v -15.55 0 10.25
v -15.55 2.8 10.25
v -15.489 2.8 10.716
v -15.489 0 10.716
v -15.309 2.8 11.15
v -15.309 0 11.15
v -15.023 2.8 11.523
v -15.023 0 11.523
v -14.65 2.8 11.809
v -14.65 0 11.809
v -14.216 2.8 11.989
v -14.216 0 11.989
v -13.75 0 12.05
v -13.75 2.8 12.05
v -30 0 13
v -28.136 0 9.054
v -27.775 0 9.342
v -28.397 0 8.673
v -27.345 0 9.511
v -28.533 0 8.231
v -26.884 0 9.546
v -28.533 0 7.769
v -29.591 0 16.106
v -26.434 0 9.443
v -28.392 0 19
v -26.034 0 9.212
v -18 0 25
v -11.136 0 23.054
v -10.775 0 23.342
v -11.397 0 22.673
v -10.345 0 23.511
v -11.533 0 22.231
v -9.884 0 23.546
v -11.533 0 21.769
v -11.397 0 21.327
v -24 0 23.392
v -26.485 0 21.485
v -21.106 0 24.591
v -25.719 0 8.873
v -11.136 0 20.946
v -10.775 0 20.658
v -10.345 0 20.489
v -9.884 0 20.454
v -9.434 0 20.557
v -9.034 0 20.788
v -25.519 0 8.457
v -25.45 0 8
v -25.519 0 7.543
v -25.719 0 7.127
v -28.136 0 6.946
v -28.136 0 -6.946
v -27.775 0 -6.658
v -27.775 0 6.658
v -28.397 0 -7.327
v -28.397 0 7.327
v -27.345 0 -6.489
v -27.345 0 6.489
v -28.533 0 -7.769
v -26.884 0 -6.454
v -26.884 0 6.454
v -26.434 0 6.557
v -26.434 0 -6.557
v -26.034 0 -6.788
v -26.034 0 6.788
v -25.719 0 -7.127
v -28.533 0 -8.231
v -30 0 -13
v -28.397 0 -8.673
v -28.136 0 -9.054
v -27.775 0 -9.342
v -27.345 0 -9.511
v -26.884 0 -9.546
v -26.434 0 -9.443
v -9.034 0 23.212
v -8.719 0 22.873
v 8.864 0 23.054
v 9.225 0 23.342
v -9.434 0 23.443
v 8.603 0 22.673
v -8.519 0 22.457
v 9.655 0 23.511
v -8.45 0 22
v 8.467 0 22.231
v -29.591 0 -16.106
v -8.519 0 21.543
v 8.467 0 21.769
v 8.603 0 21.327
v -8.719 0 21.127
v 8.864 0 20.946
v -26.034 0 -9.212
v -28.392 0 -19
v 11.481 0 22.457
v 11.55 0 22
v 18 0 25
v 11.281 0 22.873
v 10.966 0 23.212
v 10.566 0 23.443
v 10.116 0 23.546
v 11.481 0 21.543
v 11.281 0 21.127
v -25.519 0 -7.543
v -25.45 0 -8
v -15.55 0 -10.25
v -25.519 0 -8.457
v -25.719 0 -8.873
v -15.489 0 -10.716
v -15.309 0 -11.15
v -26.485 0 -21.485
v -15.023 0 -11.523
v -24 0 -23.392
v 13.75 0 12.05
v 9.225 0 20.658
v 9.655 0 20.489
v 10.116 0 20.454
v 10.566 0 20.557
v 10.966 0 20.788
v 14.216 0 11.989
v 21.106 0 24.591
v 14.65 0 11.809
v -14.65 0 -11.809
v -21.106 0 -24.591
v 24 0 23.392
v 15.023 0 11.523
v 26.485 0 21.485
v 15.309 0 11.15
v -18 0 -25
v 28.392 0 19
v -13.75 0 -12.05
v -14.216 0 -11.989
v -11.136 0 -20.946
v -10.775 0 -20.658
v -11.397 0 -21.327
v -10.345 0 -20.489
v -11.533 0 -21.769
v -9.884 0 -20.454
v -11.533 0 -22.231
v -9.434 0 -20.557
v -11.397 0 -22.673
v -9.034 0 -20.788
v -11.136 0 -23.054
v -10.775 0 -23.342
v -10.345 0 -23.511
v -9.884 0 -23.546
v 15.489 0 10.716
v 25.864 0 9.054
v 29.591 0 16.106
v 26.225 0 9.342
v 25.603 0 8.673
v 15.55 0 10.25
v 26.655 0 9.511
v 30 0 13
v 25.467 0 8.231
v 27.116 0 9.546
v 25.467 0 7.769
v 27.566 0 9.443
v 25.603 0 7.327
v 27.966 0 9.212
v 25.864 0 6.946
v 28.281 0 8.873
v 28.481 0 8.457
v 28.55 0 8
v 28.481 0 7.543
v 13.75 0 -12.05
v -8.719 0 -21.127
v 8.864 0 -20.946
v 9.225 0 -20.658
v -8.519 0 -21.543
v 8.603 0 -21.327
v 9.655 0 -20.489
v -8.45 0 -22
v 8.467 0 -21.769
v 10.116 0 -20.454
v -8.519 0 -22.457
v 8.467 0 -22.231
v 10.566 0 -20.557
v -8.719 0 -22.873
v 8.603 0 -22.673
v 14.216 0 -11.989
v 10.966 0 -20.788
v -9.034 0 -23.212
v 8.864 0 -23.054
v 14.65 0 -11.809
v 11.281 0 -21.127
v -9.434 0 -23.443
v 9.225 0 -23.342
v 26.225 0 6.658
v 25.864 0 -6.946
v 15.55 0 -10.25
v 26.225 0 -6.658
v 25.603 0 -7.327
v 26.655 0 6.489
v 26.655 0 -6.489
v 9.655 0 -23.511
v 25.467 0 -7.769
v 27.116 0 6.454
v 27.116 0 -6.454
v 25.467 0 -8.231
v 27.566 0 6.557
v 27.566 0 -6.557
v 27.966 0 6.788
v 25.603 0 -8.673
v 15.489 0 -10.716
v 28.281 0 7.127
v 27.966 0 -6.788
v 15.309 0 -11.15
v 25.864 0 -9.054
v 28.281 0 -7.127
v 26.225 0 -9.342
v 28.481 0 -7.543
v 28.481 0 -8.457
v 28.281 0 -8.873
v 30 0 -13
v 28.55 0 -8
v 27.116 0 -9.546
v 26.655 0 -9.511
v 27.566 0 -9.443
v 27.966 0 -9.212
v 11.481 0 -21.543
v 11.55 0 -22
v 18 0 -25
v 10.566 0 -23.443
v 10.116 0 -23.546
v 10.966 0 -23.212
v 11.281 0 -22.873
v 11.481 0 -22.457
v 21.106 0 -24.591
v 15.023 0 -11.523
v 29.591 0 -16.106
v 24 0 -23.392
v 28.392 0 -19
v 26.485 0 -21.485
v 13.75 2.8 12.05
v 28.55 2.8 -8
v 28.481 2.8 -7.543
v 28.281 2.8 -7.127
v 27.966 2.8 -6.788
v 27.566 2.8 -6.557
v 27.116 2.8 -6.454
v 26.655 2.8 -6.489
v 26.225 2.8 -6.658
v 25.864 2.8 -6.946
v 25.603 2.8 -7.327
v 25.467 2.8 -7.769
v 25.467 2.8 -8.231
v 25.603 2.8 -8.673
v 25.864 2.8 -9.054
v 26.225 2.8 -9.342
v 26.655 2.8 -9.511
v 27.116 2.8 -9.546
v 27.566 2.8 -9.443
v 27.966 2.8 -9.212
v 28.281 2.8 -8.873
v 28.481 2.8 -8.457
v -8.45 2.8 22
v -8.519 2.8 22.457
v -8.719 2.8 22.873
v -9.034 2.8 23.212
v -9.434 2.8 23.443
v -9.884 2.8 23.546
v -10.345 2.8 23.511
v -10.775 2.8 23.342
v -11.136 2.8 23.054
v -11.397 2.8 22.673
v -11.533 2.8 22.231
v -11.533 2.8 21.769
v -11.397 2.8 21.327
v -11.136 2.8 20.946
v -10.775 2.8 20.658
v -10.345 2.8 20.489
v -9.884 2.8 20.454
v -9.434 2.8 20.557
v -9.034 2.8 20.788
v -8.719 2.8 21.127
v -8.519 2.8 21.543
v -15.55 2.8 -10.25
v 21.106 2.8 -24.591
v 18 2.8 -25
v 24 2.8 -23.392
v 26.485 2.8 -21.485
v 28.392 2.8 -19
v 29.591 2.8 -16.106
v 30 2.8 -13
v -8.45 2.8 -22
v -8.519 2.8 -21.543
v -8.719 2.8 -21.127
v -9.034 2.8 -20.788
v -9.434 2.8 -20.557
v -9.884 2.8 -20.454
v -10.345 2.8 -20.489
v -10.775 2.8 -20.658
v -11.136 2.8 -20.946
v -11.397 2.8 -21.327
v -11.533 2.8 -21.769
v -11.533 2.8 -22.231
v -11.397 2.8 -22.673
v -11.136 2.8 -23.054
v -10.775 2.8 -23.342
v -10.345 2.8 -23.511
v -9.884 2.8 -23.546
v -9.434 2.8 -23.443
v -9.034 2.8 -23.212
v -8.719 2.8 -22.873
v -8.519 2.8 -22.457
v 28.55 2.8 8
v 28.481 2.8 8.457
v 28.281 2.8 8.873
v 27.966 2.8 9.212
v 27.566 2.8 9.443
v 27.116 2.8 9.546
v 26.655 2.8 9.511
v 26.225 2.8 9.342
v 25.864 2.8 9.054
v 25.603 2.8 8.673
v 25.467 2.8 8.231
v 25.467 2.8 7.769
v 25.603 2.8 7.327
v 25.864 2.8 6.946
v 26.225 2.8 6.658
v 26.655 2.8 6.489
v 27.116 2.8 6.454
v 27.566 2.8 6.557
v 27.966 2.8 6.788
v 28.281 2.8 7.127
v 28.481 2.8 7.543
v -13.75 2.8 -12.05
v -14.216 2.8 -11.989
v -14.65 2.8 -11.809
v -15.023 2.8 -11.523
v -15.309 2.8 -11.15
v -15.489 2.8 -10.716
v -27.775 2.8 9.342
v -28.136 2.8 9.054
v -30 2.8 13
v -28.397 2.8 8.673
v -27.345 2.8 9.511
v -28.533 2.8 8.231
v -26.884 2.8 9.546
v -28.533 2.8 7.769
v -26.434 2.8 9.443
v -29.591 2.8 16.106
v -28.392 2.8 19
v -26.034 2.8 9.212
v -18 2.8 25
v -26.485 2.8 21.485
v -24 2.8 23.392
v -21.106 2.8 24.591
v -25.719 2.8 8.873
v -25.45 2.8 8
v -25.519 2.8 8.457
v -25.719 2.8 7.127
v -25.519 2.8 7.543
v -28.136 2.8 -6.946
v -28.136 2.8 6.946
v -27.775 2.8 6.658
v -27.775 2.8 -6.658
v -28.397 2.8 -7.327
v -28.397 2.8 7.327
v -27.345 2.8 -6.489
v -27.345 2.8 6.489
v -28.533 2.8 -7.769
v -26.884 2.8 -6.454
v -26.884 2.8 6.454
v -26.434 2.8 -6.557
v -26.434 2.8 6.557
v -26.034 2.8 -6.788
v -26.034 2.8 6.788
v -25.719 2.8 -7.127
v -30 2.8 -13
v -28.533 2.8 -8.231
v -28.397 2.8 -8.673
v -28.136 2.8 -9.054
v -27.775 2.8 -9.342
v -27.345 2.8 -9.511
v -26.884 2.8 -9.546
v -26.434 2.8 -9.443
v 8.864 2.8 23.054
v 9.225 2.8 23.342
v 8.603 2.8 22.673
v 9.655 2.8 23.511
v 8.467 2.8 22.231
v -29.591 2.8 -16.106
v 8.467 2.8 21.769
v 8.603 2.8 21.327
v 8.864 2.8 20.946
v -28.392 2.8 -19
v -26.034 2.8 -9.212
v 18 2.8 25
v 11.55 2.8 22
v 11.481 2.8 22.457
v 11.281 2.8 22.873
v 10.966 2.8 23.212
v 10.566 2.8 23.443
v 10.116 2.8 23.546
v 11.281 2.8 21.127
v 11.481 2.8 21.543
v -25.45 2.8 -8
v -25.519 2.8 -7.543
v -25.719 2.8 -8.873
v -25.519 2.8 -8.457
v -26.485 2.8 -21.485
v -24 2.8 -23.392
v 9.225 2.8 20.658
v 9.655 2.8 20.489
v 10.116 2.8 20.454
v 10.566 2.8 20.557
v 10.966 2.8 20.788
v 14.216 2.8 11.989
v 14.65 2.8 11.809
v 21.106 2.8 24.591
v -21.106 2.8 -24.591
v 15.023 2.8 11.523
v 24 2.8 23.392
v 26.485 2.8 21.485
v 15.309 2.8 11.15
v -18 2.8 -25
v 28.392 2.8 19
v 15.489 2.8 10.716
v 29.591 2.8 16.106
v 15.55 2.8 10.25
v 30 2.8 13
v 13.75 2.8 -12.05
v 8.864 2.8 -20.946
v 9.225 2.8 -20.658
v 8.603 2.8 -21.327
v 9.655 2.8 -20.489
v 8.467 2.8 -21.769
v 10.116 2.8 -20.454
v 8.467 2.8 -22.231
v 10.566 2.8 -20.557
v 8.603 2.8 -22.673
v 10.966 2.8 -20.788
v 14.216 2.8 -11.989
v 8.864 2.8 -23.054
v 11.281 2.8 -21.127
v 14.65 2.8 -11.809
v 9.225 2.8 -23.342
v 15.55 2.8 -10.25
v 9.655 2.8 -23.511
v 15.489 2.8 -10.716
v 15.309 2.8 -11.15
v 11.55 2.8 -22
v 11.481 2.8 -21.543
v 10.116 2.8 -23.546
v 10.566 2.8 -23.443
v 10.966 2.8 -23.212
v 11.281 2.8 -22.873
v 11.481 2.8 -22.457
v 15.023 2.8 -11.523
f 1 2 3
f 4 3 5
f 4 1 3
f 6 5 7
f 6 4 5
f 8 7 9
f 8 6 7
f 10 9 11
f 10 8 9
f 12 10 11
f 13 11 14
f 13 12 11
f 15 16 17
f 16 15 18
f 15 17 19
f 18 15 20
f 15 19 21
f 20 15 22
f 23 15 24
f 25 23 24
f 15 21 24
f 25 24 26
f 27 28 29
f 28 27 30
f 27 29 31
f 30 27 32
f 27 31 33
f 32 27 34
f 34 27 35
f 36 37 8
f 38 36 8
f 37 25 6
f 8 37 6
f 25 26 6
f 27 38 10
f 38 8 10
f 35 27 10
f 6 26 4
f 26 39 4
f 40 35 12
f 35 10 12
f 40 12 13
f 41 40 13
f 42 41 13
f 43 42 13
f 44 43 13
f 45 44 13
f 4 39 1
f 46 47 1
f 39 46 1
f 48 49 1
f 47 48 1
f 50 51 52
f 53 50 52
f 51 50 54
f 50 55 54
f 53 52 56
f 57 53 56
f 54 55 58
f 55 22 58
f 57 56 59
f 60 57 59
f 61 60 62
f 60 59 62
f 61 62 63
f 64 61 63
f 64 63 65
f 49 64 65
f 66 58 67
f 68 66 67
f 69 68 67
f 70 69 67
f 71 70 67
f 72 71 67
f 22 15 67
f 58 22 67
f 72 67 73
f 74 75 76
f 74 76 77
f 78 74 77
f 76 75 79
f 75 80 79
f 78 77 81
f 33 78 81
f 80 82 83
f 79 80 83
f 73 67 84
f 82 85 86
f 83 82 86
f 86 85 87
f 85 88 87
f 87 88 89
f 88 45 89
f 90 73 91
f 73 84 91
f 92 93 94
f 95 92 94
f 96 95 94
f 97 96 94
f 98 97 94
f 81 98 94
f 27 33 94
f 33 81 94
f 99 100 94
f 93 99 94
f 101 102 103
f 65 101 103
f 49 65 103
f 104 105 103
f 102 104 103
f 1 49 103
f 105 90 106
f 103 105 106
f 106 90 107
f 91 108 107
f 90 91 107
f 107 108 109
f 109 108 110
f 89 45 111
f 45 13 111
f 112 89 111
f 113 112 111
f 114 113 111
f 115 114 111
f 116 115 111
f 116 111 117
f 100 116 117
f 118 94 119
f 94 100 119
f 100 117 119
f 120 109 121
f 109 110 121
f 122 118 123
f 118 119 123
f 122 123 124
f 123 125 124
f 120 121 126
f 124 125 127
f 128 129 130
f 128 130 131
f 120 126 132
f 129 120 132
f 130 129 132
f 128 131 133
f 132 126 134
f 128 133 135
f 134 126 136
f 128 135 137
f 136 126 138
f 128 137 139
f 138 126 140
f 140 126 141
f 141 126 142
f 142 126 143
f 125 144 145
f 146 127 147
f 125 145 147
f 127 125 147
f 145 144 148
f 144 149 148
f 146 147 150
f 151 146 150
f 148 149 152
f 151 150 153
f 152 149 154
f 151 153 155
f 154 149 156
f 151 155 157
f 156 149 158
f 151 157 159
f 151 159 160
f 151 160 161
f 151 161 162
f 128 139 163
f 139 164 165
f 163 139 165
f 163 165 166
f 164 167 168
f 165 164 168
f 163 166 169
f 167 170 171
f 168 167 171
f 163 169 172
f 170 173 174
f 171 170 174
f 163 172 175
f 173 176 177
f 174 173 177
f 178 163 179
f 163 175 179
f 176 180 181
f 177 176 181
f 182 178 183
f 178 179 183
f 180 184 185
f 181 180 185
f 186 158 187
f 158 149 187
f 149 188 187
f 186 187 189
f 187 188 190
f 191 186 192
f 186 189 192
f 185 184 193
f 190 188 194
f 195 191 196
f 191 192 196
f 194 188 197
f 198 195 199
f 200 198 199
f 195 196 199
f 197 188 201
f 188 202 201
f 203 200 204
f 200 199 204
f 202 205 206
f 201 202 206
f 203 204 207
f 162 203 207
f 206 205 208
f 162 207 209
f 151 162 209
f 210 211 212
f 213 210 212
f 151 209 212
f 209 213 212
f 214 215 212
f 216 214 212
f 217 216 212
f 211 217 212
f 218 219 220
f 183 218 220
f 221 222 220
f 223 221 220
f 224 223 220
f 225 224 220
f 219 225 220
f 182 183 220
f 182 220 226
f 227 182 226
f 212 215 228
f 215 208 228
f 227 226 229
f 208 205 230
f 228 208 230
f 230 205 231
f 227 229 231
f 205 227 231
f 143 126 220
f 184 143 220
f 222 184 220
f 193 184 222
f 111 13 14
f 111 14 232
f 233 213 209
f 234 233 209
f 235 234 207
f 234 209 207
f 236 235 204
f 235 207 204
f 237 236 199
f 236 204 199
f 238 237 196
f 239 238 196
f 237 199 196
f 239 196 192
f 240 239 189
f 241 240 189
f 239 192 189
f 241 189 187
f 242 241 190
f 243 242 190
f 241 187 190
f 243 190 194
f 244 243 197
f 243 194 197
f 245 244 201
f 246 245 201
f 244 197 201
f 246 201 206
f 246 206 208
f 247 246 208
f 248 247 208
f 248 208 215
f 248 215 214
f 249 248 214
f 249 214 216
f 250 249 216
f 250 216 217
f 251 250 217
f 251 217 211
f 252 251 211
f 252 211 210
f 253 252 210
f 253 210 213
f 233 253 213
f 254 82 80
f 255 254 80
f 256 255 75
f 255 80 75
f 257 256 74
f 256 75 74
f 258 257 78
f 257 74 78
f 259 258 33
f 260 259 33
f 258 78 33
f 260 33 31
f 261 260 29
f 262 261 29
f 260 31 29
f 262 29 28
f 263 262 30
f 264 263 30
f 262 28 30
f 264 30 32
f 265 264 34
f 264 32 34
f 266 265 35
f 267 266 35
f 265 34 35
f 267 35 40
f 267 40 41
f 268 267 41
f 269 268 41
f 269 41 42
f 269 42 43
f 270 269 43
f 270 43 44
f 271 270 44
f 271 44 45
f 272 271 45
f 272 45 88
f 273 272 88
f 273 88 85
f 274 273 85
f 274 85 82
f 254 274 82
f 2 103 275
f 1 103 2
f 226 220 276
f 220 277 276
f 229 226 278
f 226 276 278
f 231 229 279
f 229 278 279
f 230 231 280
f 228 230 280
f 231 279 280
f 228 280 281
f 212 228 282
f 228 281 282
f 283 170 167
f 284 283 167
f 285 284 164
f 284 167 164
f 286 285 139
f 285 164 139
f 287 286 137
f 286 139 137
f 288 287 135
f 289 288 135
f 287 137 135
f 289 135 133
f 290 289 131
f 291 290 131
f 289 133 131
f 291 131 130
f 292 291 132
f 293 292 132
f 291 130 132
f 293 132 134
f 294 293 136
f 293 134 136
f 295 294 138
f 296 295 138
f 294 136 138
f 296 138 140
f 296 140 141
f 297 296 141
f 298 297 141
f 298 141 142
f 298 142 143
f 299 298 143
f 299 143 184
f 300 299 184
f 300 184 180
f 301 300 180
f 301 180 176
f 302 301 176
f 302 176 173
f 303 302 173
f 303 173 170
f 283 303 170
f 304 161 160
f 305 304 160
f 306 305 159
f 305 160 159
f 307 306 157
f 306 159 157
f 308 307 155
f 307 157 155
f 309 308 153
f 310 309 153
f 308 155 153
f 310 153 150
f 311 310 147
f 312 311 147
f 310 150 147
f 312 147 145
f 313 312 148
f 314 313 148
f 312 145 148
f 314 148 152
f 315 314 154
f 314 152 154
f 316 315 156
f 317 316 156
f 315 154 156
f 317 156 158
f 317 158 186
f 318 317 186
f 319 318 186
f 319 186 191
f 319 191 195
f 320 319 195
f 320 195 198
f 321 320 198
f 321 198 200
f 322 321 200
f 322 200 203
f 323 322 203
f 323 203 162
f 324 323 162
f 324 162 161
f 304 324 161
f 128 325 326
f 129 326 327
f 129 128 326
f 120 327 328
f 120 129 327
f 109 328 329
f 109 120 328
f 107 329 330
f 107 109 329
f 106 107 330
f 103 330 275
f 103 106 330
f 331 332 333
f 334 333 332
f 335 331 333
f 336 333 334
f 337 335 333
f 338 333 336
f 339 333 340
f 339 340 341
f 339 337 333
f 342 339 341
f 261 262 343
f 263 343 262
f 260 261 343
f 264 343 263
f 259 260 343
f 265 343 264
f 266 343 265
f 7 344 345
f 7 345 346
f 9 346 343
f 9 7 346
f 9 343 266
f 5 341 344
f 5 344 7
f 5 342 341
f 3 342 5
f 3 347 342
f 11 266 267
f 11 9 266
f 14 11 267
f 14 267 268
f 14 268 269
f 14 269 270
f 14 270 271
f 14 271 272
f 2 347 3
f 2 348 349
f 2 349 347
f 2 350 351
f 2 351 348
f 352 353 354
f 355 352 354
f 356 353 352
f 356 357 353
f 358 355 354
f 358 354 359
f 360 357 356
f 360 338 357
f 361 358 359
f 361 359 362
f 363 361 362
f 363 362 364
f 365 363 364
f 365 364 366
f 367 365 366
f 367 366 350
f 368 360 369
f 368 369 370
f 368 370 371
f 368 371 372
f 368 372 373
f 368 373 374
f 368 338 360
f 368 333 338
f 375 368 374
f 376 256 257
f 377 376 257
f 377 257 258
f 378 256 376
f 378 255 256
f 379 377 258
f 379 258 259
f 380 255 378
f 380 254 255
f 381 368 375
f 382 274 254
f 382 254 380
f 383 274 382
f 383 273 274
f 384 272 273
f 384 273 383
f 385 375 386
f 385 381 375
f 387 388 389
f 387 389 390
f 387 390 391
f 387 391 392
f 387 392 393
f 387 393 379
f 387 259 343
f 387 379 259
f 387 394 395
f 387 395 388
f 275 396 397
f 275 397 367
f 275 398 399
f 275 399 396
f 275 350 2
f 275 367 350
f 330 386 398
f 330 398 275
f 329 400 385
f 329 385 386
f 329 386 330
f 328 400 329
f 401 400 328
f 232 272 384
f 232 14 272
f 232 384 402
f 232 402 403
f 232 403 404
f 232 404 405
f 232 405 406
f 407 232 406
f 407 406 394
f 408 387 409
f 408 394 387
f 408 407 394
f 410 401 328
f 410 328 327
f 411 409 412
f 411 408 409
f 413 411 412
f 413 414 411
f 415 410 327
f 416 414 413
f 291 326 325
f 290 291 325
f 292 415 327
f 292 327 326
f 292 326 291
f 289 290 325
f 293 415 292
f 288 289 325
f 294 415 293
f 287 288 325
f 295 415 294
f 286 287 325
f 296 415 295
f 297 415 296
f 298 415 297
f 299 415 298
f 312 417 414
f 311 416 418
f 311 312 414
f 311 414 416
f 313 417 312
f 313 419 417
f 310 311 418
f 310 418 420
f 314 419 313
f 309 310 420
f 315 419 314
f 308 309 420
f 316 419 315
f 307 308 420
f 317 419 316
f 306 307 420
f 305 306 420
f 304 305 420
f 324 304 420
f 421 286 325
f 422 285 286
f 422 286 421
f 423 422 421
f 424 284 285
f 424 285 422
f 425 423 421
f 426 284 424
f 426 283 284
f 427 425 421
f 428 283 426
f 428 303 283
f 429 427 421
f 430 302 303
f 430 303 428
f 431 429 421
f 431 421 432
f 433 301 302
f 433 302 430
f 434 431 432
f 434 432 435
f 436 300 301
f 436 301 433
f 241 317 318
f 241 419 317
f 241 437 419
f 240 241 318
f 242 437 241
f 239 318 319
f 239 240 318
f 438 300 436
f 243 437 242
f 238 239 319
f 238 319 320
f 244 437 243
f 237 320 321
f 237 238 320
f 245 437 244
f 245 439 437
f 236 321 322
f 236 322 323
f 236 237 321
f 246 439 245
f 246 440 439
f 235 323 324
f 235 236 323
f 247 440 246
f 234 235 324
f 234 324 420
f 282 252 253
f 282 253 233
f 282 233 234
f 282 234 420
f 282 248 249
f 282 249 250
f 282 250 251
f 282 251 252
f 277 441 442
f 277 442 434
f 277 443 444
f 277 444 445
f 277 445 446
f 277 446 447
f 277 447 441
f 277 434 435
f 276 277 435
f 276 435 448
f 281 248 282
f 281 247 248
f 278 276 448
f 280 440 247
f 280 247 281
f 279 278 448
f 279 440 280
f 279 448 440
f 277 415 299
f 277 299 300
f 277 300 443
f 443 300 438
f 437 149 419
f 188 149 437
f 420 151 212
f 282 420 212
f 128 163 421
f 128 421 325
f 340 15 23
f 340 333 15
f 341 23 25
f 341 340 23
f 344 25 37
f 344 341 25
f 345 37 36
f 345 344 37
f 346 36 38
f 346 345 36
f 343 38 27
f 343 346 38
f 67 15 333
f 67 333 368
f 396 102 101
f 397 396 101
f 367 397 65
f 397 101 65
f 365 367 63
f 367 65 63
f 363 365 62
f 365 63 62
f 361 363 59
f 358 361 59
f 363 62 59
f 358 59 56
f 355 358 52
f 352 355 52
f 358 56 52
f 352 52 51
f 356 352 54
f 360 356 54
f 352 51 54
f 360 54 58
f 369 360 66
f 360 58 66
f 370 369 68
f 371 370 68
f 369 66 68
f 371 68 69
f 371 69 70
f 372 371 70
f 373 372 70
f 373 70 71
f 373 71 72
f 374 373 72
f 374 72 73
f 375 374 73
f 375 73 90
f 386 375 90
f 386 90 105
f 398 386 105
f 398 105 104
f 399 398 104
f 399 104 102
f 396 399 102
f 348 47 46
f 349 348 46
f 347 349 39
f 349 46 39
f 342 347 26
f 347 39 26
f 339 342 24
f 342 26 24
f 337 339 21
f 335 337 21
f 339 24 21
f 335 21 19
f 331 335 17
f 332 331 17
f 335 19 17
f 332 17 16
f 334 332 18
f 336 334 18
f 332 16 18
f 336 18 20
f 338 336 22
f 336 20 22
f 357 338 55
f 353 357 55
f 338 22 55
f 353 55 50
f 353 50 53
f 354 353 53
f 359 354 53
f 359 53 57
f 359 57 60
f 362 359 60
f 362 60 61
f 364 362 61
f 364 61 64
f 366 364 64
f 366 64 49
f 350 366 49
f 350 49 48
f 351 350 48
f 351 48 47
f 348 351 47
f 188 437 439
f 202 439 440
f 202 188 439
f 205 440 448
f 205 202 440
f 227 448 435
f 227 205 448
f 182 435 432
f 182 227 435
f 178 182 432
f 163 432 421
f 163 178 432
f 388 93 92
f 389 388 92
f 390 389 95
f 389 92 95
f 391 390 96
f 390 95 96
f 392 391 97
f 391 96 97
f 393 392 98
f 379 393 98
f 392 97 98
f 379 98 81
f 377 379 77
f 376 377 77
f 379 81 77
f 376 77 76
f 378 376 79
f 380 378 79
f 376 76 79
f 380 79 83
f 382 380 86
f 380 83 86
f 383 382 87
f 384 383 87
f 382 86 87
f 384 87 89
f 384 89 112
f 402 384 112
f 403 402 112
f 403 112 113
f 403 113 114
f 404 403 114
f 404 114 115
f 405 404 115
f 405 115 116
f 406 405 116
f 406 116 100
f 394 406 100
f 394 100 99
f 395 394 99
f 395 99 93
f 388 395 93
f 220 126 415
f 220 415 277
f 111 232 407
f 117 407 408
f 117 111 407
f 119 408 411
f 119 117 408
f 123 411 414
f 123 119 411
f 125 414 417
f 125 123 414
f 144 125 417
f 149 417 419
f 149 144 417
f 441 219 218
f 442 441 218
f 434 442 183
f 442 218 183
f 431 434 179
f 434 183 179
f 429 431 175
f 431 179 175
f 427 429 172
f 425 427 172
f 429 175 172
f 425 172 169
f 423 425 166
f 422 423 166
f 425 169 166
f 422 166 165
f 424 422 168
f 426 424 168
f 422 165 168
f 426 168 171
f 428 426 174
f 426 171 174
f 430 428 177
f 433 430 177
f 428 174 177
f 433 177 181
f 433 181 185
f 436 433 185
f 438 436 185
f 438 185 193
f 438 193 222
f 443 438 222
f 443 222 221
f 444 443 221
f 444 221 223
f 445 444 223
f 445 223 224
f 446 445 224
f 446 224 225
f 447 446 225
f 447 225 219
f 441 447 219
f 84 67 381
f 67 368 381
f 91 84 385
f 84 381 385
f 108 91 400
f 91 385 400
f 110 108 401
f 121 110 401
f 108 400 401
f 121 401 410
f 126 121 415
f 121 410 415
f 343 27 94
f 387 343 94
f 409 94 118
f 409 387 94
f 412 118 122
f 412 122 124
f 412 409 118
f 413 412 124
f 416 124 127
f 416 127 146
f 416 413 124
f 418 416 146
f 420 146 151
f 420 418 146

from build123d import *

# Parameters (mm, degrees)
SKETCH_1_W          = 60
SKETCH_1_H          = 50
SKETCH_1_W_2        = 29.5
SKETCH_1_H_2        = 22.5
EXTRUDE_1_DEPTH     = 2.8
SKETCH_8_R          = 1.55
CUT_EXTRUDE_2_DEPTH = 10
FILLET_1_R          = 1
FILLET_2_R          = 12
CUT_EXTRUDE_3_DEPTH = 10


with BuildPart() as part:
    # 草图1 → 凸台-拉伸1 (new body)
    with BuildSketch(Plane(origin=(0, 0, 0), x_dir=(1, 0, 0), z_dir=(0, 1, 0))):
        Rectangle(SKETCH_1_W, SKETCH_1_H)
        Rectangle(SKETCH_1_W_2, SKETCH_1_H_2, mode=Mode.SUBTRACT)
    extrude(amount=EXTRUDE_1_DEPTH)

    # 草图8 → 切除-拉伸2 (cut)
    with BuildSketch(Plane.XZ):
        with Locations((27, 8)):
            Circle(SKETCH_8_R)
        with Locations((10, 22)):
            Circle(SKETCH_8_R)
        with Locations((-10, 22)):
            Circle(SKETCH_8_R)
        with Locations((-27, 8)):
            Circle(SKETCH_8_R)
        with Locations((-27, -8)):
            Circle(SKETCH_8_R)
        with Locations((-10, -22)):
            Circle(SKETCH_8_R)
        with Locations((10, -22)):
            Circle(SKETCH_8_R)
        with Locations((27, -8)):
            Circle(SKETCH_8_R)
    extrude(amount=-CUT_EXTRUDE_2_DEPTH, mode=Mode.SUBTRACT)

    # 圆角1
    fillet_1_edges = [part.edges().sort_by_distance(p)[0] for p in [
        (14.75, 1.4, 11.25),
        (14.75, 1.4, -11.25),
        (-14.75, 1.4, -11.25),
        (-14.75, 1.4, 11.25),
    ]]
    fillet(fillet_1_edges, radius=FILLET_1_R)

    # 圆角2
    fillet_2_edges = [part.edges().sort_by_distance(p)[0] for p in [
        (30, 1.4, 25),
        (-30, 1.4, 25),
        (-30, 1.4, -25),
        (30, 1.4, -25),
    ]]
    fillet(fillet_2_edges, radius=FILLET_2_R)

    # 草图9 → 切除-拉伸3 (cut)
    with BuildSketch(Plane.XZ):
        with BuildLine():
            Line((-13.75, 12.05), (13.75, 12.05))
            ThreePointArc((13.75, 12.05), (15.022792206, 11.522792206), (15.55, 10.25))
            Line((15.55, 10.25), (15.55, -10.25))
            ThreePointArc((15.55, -10.25), (15.022792206, -11.522792206), (13.75, -12.05))
            Line((13.75, -12.05), (-13.75, -12.05))
            ThreePointArc((-13.75, -12.05), (-15.022792206, -11.522792206), (-15.55, -10.25))
            Line((-15.55, -10.25), (-15.55, 10.25))
            ThreePointArc((-15.55, 10.25), (-15.022792206, 11.522792206), (-13.75, 12.05))
        make_face()
    extrude(amount=-CUT_EXTRUDE_3_DEPTH, mode=Mode.SUBTRACT)


solid = part.part
